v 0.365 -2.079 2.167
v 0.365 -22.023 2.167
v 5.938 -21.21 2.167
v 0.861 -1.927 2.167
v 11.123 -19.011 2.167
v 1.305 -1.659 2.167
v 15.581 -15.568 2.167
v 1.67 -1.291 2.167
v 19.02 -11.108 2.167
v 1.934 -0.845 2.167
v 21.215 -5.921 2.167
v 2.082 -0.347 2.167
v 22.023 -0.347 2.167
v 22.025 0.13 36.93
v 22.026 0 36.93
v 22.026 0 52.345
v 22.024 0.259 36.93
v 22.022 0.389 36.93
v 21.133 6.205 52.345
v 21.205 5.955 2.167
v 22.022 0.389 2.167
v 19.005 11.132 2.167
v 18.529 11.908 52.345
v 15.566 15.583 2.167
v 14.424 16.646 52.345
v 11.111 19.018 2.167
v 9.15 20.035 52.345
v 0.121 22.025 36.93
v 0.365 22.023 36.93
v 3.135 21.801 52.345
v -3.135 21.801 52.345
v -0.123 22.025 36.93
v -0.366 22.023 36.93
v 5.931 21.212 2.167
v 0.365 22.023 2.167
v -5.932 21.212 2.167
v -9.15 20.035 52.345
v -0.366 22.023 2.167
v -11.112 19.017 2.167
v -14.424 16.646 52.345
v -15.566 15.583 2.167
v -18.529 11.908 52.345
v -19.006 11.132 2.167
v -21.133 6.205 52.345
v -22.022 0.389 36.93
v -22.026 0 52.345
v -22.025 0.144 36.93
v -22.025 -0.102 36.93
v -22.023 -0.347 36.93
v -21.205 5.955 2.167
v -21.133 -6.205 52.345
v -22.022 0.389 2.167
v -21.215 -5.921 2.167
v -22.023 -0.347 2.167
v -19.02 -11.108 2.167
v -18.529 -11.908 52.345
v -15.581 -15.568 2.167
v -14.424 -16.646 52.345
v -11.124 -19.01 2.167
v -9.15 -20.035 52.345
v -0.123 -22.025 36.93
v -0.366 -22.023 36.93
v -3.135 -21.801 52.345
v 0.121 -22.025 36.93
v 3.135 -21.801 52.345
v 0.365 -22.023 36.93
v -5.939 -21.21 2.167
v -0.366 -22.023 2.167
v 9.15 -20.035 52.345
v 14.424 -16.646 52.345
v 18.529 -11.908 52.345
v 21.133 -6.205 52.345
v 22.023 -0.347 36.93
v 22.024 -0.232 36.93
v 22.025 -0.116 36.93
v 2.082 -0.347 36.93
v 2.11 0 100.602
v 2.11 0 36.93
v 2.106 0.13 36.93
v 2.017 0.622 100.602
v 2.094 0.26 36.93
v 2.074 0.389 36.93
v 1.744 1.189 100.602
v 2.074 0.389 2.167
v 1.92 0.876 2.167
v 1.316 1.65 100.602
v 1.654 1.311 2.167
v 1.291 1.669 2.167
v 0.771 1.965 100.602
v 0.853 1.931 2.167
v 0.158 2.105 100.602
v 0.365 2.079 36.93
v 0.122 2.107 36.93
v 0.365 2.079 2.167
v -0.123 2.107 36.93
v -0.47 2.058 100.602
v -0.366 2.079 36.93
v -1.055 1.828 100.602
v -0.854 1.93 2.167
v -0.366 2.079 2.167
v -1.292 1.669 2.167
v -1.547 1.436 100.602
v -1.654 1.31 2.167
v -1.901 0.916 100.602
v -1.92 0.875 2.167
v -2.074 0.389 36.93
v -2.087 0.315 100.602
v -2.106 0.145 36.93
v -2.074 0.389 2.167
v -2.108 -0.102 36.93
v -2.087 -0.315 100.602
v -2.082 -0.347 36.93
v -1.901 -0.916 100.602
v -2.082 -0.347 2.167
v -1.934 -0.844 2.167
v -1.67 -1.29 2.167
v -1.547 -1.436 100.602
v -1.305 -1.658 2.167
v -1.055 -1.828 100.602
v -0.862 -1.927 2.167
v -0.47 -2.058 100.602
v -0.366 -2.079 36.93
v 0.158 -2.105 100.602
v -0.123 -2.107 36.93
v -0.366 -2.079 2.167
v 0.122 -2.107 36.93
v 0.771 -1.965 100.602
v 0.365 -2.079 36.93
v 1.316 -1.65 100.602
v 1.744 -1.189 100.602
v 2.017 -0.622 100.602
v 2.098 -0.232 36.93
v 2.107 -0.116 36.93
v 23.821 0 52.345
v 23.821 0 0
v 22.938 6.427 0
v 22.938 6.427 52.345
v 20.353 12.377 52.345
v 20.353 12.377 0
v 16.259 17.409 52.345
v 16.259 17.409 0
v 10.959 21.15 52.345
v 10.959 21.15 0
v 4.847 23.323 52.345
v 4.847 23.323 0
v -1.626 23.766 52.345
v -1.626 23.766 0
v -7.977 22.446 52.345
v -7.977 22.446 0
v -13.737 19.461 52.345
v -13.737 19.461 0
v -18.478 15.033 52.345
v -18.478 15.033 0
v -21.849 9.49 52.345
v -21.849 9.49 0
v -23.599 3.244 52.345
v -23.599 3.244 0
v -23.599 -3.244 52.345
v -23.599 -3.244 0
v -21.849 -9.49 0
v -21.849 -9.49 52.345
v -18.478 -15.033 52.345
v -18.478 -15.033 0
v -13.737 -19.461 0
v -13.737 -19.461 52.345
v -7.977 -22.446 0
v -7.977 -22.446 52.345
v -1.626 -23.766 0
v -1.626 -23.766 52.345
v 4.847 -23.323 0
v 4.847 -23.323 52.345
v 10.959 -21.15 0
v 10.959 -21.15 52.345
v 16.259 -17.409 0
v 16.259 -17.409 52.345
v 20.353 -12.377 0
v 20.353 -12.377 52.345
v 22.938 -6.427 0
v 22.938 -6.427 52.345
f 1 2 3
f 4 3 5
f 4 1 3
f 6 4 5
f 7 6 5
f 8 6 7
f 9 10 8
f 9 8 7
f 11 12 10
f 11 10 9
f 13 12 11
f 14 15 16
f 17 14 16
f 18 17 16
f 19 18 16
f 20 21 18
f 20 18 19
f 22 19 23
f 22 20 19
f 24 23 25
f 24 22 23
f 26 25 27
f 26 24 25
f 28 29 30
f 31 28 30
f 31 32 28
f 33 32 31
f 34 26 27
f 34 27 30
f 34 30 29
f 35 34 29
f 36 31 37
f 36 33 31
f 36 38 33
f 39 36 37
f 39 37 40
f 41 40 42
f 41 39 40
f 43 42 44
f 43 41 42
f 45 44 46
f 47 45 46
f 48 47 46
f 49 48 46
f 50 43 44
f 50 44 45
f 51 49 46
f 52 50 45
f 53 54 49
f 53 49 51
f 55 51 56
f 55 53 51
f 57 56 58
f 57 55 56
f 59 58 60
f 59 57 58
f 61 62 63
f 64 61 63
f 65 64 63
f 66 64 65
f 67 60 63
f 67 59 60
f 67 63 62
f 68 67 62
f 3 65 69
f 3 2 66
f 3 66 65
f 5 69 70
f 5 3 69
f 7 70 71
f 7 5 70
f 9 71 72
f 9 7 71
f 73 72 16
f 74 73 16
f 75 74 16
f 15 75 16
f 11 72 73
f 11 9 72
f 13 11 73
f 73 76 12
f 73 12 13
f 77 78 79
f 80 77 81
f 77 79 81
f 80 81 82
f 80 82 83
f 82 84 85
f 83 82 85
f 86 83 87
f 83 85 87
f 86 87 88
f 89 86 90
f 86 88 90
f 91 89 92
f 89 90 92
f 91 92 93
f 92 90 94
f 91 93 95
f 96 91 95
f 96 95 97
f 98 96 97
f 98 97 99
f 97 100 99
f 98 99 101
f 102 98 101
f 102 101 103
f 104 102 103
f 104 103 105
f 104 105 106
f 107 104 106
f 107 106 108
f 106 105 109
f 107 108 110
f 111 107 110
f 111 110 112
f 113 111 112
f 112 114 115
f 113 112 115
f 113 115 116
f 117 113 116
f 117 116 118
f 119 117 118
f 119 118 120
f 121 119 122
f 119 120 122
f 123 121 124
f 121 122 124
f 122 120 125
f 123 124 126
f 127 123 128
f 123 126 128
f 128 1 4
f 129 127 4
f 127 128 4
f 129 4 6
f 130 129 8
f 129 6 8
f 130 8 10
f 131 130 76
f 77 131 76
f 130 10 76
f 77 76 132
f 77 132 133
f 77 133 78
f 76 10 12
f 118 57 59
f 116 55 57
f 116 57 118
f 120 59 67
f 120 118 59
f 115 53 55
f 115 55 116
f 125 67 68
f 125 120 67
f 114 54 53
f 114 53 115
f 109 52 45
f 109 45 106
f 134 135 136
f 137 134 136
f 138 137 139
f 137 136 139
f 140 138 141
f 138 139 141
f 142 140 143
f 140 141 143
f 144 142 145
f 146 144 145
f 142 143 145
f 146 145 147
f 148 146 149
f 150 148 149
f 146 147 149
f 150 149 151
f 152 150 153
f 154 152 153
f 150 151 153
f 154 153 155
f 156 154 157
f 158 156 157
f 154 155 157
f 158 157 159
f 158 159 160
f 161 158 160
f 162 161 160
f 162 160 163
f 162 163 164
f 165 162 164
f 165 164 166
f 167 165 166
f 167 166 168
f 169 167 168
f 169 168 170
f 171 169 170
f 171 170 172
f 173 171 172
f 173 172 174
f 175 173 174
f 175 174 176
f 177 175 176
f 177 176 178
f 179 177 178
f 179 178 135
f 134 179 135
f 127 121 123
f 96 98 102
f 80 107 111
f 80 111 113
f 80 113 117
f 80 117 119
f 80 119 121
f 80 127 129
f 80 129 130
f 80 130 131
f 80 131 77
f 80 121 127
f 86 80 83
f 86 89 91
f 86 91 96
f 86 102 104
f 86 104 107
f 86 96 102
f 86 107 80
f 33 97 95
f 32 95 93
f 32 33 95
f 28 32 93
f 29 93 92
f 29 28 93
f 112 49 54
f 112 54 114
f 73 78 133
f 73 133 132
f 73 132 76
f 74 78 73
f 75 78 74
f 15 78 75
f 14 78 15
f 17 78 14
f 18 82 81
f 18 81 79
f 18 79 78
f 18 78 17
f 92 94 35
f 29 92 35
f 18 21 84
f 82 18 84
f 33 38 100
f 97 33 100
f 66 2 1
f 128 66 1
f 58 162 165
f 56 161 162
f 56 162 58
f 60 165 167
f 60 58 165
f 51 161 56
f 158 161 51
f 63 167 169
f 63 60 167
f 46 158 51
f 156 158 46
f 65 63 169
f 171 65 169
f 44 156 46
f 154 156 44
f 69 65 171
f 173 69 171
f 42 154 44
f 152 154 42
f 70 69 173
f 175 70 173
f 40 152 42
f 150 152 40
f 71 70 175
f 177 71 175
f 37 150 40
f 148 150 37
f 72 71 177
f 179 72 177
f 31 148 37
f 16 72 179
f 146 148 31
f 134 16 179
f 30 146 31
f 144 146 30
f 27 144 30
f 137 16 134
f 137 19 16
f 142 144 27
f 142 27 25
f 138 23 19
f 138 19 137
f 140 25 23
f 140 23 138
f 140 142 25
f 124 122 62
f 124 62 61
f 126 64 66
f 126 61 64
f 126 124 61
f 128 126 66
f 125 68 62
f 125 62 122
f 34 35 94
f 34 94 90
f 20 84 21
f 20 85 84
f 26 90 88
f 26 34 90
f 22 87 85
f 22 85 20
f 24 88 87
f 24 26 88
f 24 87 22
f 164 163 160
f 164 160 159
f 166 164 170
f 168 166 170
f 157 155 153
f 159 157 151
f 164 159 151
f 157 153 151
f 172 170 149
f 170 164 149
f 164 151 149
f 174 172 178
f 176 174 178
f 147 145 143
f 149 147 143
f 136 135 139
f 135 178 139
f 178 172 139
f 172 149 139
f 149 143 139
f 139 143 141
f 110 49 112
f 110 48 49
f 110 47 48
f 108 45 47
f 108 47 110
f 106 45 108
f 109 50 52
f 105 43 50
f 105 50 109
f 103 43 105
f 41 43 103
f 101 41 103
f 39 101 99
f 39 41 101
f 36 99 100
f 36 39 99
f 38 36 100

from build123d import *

# Parameters (mm, degrees)
F0_R         = 23.8211318964
F0_R_2       = 22.0256608
F3_DEPTH     = 50.17713
F3_FACE_R    = 23.8211318964
F3_FACE_R_2  = 22.0256608
F3_FACE1_R   = 23.8211318964
F3_FACE1_R_2 = 22.0256608
F4_DEPTH     = 2.16738
F1_R         = 2.1104987
F5_DEPTH     = 100.6018
F2_W         = 22.9499428533
F2_H         = 0.7366
F2_W_2       = 0.7306225889
F2_H_2       = 22.9688390891
F2_W_3       = 22.9015578225
F2_H_3       = 22.9767380224
F6_DEPTH     = 36.93024


with BuildPart() as f3:
    # F0 (on Top) → F3 (new body)
    with BuildSketch(Plane.XY):
        Circle(F0_R)
        Circle(F0_R_2, mode=Mode.SUBTRACT)
    extrude(amount=F3_DEPTH)

    # F0 (on Top) + F3_face (on face) + F3_face1 (on face) → F4 (join)
    with BuildSketch(Plane.XY):
        Circle(F0_R)
        Circle(F0_R_2, mode=Mode.SUBTRACT)
        Circle(F0_R_2)
    with BuildSketch(Plane.XY.offset(50.17713)):
        Circle(F3_FACE_R)
        Circle(F3_FACE_R_2, mode=Mode.SUBTRACT)
    with BuildSketch(Plane(origin=(0, 0, 0), x_dir=(1, 0, 0), z_dir=(0, 0, -1))):
        Circle(F3_FACE1_R)
        Circle(F3_FACE1_R_2, mode=Mode.SUBTRACT)
    extrude(amount=F4_DEPTH, dir=(0, 0, 1))

    # F1 (on Top) → F5 (join)
    with BuildSketch(Plane.XY):
        Circle(F1_R)
    extrude(amount=F5_DEPTH)

    # F2 (on Top) → F6 (join)
    with BuildSketch(Plane.XY):
        with Locations((11.8395101745, 0.0209339964)):
            Rectangle(F2_W, F2_H)
        with Locations((-0.0007725466, 0.0209339964)):
            Rectangle(F2_W_2, F2_H)
        with Locations((-0.0007725466, 11.873653541)):
            Rectangle(F2_W_2, F2_H_2)
        with Locations((-11.8168627523, 0.0209339964)):
            Rectangle(F2_W_3, F2_H)
        with Locations((-0.0007725466, -11.8357350148)):
            Rectangle(F2_W_2, F2_H_3)
    extrude(amount=F6_DEPTH)


solid = f3.part
